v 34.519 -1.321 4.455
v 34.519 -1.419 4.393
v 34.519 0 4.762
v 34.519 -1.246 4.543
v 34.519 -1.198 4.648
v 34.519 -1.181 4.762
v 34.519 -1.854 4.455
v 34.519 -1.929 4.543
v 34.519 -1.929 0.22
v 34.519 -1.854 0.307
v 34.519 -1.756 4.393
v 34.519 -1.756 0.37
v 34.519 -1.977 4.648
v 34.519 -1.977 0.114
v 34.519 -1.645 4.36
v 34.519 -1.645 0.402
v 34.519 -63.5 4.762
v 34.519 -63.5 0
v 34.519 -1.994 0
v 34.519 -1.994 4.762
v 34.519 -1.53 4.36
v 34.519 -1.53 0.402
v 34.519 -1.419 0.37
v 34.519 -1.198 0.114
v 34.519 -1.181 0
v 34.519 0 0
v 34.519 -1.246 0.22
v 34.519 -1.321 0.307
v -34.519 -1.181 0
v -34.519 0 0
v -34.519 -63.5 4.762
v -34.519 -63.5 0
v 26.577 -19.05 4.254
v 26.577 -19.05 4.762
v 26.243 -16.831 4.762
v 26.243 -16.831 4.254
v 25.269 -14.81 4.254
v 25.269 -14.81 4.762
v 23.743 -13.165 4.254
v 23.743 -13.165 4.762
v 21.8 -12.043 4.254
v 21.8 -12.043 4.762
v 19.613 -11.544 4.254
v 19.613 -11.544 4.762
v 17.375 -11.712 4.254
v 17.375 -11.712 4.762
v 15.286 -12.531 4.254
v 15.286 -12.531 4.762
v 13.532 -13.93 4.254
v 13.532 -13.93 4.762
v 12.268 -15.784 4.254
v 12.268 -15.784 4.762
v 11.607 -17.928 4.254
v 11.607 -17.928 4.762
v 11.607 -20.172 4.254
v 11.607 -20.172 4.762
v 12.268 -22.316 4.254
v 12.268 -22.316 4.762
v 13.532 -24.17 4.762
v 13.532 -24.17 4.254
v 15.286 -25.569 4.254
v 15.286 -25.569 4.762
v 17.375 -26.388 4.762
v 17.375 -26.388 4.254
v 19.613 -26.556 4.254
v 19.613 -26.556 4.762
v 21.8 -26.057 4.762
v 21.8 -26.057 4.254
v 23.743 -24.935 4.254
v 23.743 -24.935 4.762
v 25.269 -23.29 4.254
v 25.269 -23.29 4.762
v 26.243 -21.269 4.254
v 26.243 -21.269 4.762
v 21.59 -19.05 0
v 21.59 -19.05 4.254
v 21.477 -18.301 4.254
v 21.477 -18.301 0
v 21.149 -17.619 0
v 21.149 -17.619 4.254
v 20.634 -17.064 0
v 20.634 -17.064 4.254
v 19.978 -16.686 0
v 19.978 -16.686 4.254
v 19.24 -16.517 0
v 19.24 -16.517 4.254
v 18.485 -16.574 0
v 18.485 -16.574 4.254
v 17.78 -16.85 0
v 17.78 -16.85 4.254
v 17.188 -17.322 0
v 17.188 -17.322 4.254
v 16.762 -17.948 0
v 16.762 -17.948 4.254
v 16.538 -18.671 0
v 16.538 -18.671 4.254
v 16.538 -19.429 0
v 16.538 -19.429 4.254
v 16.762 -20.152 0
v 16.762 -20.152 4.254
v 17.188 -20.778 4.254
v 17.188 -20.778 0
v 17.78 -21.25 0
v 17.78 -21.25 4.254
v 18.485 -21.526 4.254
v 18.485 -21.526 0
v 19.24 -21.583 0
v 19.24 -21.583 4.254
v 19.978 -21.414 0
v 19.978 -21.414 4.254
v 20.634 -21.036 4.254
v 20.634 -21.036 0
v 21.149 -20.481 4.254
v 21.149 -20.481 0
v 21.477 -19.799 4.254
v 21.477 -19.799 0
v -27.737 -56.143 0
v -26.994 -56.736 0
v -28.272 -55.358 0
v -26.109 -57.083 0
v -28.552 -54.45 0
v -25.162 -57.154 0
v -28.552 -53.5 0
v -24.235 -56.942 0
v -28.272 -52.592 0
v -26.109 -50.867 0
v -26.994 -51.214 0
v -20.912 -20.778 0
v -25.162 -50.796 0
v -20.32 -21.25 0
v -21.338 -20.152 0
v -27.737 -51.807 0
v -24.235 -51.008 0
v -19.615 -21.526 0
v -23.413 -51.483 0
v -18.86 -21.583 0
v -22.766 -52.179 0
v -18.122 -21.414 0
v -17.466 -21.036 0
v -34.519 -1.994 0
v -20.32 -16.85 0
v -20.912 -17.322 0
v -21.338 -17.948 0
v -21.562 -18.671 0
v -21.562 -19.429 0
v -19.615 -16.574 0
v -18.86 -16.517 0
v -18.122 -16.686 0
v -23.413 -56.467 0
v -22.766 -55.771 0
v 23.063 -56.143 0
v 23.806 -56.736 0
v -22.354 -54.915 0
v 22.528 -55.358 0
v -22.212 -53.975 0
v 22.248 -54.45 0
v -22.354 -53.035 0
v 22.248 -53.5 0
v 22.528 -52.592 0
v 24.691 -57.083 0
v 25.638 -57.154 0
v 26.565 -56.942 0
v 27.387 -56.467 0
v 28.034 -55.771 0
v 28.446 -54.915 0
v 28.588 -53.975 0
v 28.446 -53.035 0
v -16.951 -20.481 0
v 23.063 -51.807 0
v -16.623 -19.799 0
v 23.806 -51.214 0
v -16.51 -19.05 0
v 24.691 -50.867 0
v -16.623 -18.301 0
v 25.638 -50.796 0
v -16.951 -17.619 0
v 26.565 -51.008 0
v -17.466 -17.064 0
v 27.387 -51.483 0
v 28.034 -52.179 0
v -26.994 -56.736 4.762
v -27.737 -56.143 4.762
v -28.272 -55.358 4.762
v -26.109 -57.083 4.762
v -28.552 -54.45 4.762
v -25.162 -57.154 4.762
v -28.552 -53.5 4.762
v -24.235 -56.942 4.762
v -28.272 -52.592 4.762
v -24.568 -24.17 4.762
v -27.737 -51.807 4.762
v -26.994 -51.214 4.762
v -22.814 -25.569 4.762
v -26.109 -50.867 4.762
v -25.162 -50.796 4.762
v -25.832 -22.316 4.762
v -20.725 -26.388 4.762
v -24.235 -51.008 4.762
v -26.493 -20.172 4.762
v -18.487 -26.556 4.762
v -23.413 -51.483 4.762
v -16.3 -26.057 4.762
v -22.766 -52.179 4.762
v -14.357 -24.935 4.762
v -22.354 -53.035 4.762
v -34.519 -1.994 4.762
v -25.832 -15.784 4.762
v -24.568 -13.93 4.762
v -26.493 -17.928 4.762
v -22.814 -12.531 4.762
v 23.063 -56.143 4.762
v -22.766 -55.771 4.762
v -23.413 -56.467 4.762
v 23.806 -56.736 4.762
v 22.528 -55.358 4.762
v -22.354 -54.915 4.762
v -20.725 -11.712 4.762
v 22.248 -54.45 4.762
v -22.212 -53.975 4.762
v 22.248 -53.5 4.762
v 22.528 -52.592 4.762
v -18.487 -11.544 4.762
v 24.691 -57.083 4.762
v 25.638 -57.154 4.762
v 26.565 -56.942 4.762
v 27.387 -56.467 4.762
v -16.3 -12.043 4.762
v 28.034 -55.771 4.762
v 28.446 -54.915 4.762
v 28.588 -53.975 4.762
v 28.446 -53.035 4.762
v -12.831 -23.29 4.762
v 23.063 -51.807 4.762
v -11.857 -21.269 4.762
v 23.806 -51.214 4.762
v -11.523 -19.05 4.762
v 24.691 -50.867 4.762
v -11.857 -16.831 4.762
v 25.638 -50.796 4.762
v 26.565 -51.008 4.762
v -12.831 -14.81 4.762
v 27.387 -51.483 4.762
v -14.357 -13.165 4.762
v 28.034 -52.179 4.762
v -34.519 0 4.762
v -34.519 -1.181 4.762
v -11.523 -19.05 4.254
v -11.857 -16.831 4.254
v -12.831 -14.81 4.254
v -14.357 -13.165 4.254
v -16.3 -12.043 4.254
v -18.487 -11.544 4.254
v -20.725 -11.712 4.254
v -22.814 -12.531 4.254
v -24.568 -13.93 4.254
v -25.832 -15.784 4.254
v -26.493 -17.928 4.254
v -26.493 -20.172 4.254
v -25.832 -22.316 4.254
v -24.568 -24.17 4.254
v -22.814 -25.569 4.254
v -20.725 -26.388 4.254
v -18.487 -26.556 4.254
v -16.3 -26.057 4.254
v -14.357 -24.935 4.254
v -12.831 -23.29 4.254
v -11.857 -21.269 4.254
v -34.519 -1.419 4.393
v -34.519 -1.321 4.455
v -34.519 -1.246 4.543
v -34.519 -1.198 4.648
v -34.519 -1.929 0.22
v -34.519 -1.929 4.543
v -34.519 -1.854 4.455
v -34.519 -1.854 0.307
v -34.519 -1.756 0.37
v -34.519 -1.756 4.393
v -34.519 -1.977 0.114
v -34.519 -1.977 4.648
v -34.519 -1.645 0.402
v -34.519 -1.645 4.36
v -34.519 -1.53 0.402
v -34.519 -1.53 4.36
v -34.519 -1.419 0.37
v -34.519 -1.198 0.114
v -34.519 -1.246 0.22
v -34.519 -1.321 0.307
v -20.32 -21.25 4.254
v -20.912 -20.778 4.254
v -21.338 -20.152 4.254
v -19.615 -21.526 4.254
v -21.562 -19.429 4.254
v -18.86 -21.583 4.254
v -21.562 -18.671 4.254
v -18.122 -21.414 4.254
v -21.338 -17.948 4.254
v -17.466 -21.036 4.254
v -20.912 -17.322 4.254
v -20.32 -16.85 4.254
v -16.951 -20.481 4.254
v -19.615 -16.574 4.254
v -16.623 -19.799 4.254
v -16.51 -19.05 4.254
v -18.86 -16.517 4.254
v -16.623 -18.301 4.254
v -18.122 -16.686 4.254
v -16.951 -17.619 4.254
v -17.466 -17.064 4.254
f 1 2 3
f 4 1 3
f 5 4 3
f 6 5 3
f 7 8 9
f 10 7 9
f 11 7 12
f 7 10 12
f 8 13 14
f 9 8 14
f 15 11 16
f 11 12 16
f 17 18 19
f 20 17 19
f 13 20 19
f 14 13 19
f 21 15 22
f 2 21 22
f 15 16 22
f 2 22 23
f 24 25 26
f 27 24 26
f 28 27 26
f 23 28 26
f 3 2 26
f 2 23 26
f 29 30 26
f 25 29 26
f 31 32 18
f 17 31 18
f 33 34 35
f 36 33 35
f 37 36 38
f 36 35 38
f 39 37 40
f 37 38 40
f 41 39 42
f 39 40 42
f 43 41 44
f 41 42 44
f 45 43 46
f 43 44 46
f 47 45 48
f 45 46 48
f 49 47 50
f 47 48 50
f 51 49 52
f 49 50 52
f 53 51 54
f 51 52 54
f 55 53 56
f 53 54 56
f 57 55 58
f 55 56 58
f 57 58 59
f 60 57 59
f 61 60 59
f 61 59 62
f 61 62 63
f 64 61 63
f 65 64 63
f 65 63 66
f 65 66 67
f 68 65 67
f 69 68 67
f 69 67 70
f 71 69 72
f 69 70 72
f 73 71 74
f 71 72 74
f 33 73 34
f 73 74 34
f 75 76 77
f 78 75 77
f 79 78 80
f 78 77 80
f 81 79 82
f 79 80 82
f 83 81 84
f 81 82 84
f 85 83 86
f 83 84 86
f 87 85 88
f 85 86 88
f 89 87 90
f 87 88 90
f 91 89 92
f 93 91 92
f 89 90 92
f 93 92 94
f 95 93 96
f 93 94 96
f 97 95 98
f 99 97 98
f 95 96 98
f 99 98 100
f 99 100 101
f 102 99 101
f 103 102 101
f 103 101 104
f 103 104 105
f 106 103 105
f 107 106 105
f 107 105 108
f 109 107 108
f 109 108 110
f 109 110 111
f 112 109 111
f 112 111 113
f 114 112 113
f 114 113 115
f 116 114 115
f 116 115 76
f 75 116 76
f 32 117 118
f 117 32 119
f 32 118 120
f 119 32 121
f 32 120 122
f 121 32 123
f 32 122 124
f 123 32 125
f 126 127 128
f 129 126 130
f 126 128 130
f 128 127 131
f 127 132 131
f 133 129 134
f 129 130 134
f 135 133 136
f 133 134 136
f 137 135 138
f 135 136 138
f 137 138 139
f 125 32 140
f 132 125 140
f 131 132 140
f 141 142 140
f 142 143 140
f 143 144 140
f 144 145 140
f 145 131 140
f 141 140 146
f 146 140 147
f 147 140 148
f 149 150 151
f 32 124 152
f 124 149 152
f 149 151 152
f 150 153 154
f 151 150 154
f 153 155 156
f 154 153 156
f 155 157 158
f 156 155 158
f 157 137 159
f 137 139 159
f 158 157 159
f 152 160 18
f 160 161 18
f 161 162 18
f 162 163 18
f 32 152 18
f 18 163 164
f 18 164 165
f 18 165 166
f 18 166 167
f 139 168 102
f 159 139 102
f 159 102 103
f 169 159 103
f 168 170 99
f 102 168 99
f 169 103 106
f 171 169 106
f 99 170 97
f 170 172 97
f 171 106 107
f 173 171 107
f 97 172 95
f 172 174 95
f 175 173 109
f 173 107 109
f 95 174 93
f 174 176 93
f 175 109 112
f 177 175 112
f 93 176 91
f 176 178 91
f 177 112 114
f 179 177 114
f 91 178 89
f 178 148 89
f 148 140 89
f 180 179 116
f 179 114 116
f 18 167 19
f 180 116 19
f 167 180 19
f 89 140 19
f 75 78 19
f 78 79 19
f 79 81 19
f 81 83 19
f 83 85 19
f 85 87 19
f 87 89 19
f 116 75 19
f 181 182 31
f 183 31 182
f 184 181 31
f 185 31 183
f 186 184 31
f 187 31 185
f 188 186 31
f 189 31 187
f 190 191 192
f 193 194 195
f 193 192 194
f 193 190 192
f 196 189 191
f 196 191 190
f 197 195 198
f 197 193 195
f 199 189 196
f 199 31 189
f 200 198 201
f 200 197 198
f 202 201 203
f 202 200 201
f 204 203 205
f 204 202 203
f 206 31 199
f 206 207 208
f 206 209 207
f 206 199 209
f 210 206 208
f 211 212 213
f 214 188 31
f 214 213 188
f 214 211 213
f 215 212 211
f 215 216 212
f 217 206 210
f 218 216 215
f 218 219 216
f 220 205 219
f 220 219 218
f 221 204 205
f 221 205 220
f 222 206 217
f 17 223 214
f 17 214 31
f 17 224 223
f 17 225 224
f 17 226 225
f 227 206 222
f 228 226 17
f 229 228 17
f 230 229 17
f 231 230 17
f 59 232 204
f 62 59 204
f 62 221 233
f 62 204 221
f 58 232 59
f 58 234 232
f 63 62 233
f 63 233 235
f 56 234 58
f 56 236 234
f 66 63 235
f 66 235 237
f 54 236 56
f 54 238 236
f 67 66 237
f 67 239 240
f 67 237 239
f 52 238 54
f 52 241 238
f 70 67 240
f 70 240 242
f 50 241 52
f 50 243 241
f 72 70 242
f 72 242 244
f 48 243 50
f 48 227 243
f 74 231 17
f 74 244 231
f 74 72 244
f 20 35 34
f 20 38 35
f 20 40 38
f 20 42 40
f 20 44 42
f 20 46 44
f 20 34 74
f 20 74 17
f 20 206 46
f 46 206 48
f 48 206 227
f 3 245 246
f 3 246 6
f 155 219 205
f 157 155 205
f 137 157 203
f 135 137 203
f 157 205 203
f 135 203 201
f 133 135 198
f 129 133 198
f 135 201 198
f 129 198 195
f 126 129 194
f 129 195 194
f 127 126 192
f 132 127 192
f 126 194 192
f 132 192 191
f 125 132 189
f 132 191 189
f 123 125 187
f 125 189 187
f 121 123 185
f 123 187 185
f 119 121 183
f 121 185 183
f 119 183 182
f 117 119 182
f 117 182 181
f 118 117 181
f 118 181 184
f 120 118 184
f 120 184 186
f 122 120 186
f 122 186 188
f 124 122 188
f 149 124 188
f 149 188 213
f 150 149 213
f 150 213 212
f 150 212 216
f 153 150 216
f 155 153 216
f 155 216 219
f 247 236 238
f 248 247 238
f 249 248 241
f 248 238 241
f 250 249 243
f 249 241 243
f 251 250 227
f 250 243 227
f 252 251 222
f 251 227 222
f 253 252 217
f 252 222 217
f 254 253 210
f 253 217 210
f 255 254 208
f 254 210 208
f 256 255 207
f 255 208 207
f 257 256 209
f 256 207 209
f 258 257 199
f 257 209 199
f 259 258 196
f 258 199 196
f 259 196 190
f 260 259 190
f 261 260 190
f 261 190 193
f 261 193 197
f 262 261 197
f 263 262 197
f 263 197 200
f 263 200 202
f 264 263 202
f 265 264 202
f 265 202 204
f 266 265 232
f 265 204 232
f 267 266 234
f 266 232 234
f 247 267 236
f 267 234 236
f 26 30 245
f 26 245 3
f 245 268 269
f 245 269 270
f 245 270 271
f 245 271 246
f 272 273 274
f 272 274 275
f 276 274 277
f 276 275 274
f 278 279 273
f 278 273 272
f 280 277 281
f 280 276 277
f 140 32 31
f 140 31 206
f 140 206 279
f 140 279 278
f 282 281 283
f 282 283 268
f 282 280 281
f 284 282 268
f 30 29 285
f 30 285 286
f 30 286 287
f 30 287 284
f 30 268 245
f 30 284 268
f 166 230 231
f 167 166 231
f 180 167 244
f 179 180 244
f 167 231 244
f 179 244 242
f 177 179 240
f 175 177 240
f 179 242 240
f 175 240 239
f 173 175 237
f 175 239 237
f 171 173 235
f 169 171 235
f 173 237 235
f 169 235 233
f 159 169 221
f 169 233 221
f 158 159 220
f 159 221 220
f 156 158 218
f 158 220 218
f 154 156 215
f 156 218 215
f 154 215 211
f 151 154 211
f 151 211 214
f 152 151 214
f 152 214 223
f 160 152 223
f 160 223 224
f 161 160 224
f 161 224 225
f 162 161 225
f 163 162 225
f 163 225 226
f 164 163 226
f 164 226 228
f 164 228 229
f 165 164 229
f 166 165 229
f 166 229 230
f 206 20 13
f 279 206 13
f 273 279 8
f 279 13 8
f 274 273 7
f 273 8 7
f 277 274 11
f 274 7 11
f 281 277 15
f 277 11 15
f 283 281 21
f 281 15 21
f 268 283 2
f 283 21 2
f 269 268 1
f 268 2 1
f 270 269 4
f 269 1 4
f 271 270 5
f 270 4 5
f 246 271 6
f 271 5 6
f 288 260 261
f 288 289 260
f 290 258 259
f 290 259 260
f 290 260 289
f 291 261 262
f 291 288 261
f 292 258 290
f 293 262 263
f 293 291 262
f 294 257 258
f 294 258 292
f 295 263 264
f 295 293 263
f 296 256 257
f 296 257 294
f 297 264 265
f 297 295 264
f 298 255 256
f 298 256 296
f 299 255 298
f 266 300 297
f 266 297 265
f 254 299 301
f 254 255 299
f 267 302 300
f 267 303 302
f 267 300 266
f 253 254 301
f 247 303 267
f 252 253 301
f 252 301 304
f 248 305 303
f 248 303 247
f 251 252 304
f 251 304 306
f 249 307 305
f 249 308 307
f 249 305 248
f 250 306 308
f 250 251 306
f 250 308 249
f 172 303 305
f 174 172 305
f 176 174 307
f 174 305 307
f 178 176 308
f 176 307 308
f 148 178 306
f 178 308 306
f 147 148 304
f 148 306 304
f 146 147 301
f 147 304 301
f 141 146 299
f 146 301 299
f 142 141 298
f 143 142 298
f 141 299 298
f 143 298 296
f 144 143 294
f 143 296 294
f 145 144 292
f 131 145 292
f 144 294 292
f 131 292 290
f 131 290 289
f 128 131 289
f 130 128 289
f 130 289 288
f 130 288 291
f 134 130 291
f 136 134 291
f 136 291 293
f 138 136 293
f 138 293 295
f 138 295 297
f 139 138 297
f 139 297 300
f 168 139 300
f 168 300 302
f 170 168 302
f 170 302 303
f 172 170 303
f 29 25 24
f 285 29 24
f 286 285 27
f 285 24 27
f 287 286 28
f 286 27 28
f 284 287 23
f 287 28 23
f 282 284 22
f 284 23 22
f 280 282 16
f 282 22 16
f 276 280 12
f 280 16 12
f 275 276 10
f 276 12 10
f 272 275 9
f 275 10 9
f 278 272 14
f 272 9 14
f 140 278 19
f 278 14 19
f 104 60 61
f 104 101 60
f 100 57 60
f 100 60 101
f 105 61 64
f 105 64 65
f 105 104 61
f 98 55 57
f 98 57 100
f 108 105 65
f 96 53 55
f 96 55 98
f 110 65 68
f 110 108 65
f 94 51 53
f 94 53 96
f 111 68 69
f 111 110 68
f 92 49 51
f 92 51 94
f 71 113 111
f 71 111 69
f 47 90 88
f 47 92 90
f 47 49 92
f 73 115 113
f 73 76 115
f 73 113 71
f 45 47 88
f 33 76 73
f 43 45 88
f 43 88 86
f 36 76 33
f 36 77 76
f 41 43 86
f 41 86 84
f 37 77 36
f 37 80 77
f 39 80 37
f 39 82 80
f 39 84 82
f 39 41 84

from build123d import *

# Parameters (mm, degrees)
F0_W     = 69.0372
F0_H     = 63.5
F1_DEPTH = 4.7625
F2_R     = 3.1877
F3_DEPTH = 4.7635
F4_R     = 2.54
F5_DEPTH = 4.7635
F4_R_2   = 7.527211353
F4_R_3   = 7.5272138977
F6_DEPTH = 0.508
F8_DEPTH = 69.0382


with BuildPart() as f1:
    # F0 (on Top) → F1 (new body)
    with BuildSketch(Plane.XY):
        with Locations((0, -31.75)):
            Rectangle(F0_W, F0_H)
    extrude(amount=F1_DEPTH)

    # F2 (on face) → F3 (cut, through all)
    with BuildSketch(Plane.XY.offset(4.7625)):
        with Locations((25.4, -53.975)):
            Circle(F2_R)
        with Locations((-25.4, -53.975)):
            Circle(F2_R)
    extrude(amount=-F3_DEPTH, mode=Mode.SUBTRACT)

    # F4 (on face) → F5 (cut, through all)
    with BuildSketch(Plane.XY.offset(4.7625)):
        with Locations((-19.05, -19.05)):
            Circle(F4_R)
        with Locations((19.05, -19.05)):
            Circle(F4_R)
    extrude(amount=-F5_DEPTH, mode=Mode.SUBTRACT)

    # F4 (on face) → F6 (cut)
    with BuildSketch(Plane.XY.offset(4.7625)):
        with Locations((-19.05, -19.05)):
            Circle(F4_R_2)
        with Locations((-19.05, -19.05)):
            Circle(F4_R, mode=Mode.SUBTRACT)
        with Locations((19.05, -19.05)):
            Circle(F4_R_3)
        with Locations((19.05, -19.05)):
            Circle(F4_R, mode=Mode.SUBTRACT)
    extrude(amount=-F6_DEPTH, mode=Mode.SUBTRACT)

    # F7 (on face) → F8 (cut, through all)
    with BuildSketch(Plane.YZ.offset(34.5186)):
        with BuildLine():
            ThreePointArc((-1.9939, 4.7625), (-1.5875, 4.3561), (-1.1811, 4.7625))
            Line((-1.1811, 4.7625), (-1.9939, 4.7625))
        make_face()
        with BuildLine():
            Line((-1.9939, 0), (-1.1811, 0))
            ThreePointArc((-1.1811, 0), (-1.5875, 0.4064), (-1.9939, 0))
        make_face()
    extrude(amount=-F8_DEPTH, mode=Mode.SUBTRACT)


solid = f1.part
